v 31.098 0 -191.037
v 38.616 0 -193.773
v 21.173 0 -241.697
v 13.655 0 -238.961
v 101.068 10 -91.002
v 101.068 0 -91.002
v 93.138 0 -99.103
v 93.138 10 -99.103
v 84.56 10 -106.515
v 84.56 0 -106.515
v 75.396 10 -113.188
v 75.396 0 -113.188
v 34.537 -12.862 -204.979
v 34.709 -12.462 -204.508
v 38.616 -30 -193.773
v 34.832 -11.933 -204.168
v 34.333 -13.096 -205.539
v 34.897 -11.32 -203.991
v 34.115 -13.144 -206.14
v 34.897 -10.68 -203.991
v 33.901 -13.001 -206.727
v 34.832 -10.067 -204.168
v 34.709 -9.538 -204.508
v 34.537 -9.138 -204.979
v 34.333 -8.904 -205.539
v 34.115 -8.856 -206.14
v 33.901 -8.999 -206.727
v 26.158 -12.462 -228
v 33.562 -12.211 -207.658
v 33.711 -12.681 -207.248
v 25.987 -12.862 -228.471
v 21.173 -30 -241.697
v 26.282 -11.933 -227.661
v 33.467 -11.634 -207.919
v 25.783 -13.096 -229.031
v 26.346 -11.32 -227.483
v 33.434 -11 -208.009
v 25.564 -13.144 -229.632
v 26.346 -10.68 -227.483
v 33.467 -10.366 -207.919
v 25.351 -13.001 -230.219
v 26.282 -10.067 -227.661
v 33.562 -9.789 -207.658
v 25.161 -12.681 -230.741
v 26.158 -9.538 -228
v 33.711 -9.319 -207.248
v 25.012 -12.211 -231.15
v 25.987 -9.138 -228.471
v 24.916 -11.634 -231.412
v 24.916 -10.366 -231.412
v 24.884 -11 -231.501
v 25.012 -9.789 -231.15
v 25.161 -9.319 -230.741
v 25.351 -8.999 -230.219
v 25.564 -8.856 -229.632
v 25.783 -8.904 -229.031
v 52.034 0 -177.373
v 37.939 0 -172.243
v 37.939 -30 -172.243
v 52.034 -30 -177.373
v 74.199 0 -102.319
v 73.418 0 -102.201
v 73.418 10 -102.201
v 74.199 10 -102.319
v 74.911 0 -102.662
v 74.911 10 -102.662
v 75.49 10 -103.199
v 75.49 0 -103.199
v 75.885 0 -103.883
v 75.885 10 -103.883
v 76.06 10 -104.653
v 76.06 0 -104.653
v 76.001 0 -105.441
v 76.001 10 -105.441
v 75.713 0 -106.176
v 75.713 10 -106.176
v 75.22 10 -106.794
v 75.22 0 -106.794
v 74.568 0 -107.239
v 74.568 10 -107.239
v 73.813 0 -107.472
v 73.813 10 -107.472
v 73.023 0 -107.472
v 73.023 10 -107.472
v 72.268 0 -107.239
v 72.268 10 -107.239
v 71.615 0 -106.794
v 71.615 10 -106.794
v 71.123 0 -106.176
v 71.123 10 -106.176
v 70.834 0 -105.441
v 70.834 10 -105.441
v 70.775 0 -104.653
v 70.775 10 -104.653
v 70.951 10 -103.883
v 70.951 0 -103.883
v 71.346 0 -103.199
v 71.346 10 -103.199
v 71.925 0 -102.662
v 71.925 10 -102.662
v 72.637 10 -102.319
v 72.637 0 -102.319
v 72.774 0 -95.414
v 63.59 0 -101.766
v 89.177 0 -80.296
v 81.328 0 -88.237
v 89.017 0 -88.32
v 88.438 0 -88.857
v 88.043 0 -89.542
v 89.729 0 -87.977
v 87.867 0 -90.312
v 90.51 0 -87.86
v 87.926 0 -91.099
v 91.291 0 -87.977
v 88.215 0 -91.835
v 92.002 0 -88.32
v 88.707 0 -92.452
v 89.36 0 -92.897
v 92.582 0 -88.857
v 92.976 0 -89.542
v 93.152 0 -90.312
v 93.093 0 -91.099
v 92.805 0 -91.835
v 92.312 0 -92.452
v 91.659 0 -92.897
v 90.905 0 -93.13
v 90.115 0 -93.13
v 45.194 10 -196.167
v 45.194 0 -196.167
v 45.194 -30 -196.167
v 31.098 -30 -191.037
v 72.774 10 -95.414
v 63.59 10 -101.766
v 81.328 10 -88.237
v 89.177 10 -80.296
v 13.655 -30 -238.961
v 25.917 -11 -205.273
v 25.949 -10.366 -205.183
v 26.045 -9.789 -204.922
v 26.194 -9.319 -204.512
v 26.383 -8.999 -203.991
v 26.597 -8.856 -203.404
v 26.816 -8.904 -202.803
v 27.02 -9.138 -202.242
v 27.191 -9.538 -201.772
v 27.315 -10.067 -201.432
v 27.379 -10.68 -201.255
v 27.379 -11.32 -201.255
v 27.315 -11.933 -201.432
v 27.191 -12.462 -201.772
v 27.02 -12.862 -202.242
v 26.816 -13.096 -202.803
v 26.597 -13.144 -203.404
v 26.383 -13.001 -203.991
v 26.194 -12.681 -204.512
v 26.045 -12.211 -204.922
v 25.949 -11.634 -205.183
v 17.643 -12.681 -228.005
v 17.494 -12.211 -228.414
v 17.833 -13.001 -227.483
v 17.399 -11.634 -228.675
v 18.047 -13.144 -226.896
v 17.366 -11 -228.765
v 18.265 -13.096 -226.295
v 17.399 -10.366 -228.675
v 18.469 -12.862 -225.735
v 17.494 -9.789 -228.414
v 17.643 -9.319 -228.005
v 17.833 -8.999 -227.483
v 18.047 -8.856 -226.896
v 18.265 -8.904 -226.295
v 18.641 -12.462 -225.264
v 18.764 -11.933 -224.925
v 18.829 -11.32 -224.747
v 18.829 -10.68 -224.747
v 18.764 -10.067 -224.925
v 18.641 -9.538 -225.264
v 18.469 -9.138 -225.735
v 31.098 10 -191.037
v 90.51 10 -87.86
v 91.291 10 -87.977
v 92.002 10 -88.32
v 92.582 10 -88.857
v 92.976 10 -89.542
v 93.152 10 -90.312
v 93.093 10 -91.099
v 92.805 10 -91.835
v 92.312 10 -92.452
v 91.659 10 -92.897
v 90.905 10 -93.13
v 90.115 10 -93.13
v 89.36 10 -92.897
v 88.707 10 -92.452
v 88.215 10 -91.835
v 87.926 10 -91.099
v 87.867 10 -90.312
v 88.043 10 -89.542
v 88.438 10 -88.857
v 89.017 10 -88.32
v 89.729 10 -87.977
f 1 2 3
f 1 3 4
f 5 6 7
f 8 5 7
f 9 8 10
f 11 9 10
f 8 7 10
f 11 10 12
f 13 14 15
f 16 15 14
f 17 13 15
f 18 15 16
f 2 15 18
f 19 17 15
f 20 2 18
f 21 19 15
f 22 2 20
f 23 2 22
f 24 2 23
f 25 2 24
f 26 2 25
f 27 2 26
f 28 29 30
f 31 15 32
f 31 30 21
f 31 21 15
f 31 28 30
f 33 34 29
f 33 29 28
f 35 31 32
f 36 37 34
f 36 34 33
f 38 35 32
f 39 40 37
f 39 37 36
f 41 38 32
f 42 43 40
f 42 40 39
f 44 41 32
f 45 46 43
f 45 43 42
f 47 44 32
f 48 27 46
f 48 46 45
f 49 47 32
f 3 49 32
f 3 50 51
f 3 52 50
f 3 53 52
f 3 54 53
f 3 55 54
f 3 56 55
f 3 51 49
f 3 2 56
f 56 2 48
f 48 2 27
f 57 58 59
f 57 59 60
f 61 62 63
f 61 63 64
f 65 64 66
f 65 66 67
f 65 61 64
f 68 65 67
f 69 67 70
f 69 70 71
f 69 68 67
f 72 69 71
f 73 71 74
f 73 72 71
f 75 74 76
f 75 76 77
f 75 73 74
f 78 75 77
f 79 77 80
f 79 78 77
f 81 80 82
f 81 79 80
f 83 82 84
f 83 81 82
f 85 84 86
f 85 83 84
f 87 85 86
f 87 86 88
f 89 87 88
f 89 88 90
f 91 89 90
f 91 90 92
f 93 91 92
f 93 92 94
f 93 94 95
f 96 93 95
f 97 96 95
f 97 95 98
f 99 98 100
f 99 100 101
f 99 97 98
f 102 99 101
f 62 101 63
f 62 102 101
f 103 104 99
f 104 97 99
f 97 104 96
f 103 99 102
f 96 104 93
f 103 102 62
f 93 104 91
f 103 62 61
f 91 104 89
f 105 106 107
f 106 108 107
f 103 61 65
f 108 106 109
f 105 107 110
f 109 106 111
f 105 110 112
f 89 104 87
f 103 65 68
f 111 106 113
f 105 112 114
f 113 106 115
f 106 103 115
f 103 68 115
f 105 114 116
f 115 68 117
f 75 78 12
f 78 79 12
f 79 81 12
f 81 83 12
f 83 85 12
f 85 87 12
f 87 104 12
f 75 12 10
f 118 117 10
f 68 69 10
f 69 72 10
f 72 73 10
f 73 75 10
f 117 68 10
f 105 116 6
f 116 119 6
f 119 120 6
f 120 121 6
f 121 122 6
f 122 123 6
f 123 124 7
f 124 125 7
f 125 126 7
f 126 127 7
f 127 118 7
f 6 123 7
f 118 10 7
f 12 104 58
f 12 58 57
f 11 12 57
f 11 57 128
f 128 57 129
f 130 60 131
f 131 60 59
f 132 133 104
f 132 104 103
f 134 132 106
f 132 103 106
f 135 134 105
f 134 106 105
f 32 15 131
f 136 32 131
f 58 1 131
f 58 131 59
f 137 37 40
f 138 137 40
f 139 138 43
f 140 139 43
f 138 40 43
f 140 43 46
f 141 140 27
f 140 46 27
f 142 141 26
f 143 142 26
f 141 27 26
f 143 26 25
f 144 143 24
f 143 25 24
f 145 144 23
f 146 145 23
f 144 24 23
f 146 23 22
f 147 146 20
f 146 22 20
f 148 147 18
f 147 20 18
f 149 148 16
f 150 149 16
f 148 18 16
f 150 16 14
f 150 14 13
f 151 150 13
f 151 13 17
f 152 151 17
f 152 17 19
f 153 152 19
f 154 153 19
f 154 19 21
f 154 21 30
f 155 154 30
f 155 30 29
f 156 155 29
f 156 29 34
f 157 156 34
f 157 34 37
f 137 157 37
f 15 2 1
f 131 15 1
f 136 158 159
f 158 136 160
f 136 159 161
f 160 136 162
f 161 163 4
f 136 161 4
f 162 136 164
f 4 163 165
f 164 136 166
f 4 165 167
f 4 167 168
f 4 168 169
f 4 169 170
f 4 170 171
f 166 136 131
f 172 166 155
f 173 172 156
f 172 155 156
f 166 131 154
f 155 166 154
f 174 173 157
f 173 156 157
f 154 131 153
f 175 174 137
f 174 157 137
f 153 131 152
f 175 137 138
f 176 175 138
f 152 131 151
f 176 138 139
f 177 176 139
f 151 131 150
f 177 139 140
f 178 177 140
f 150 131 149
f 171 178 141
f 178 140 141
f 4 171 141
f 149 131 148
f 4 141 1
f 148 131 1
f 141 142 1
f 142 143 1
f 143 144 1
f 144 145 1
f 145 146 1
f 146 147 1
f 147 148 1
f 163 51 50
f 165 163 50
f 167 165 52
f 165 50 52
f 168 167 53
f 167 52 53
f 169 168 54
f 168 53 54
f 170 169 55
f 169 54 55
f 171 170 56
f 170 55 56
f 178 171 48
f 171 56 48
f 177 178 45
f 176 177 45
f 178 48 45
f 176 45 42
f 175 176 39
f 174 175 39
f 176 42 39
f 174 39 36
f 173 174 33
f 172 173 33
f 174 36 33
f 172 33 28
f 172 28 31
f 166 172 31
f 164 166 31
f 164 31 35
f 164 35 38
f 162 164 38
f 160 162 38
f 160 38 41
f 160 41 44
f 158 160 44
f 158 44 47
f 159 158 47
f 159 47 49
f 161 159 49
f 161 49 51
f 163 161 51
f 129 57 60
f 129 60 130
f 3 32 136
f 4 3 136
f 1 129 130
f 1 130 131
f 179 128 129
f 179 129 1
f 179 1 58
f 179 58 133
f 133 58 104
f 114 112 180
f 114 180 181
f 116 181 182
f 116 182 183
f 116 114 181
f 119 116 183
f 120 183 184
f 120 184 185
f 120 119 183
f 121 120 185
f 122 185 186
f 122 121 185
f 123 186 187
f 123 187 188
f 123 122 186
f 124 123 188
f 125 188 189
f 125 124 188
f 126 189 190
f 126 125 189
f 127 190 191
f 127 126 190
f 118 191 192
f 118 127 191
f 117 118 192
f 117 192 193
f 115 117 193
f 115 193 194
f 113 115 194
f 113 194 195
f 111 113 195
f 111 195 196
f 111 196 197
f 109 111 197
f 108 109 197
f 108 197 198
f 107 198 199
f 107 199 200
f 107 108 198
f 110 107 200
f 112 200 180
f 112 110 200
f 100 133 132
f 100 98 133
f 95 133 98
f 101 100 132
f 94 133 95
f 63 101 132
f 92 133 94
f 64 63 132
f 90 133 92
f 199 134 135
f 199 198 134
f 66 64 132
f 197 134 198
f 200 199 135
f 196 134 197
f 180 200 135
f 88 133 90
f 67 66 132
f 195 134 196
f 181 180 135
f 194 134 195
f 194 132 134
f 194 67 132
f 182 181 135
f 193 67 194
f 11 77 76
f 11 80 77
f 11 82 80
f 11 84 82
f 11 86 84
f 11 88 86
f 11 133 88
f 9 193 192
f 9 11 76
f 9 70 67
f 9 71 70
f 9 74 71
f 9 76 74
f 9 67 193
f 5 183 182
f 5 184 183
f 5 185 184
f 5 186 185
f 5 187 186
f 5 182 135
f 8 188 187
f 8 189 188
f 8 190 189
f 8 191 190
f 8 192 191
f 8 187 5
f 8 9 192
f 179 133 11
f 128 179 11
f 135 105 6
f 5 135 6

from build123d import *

# Parameters (mm, degrees)
SKETCH_1_R          = 2.65
EXTRUDE_3_DEPTH     = 10
EXTRUDE_4_DEPTH     = 30
SKETCH_15_W         = 15
SKETCH_15_H         = 30
EXTRUDE_5_DEPTH     = 51
SKETCH_16_R         = 2.15
CUT_EXTRUDE_6_DEPTH = 228.080726912
SKETCH_17_W         = 51
SKETCH_17_H         = 30
CUT_EXTRUDE_7_DEPTH = 7


with BuildPart() as part:
    # 草图1 → 凸台-拉伸3 (new body)
    with BuildSketch(Plane(origin=(0, 0, 0), x_dir=(1, 0, 0), z_dir=(0, 1, 0))):
        with BuildLine():
            Line((31.098398092, 191.036570513), (63.590311708, 101.765771539))
            ThreePointArc((63.590311708, 101.765771539), (77.134513162, 91.925333174), (89.177379057, 80.295672763))
            Line((89.177379057, 80.295672763), (101.067696265, 91.001762465))
            ThreePointArc((101.067696265, 91.001762465), (88.926297254, 102.898560033), (75.395677923, 113.187860438))
            Line((75.395677923, 113.187860438), (45.193787404, 196.166872663))
            Line((45.193787404, 196.166872663), (31.098398092, 191.036570513))
        make_face()
        with Locations(Location((73.417783853, 104.851461669, 0), (0, 0, 270))):
            Circle(SKETCH_1_R, mode=Mode.SUBTRACT)
        with Locations(Location((90.509667992, 90.509667992, 0), (0, 0, 270))):
            Circle(SKETCH_1_R, mode=Mode.SUBTRACT)
    extrude(amount=EXTRUDE_3_DEPTH)

    # 草图14 → 凸台-拉伸4 (add)
    with BuildSketch(Plane.XZ):
        Polygon((45.193787404, -196.166872663), (31.098398092, -191.036570513), (37.938800959, -172.242718098), (52.03419027, -177.373020248), align=None)
    extrude(amount=EXTRUDE_4_DEPTH)


with BuildPart() as body_2:
    # 草图15 → 凸台-拉伸5 (new body)
    with BuildSketch(Plane(origin=(-57.76014874, 0, -158.694704407), x_dir=(-0.9396926207859112, 0, 0.3420201433256609), z_dir=(-0.3420201433256609, 0, -0.9396926207859113))):
        with Locations((-102.061290433, -15)):
            Rectangle(SKETCH_15_W, SKETCH_15_H)
    extrude(amount=EXTRUDE_5_DEPTH)

    # 草图16 → 切除-拉伸6 (cut, through all)
    with BuildSketch(Plane(origin=(102.953936143, 0, -37.472168257), x_dir=(-0.34202014332566083, 0, -0.9396926207859113), z_dir=(0.9396926207859113, 0, -0.34202014332566083))):
        with Locations((206.879377039, -11)):
            Circle(SKETCH_16_R)
        with Locations((181.879377039, -11)):
            Circle(SKETCH_16_R)
    extrude(amount=-CUT_EXTRUDE_6_DEPTH, mode=Mode.SUBTRACT)

    # 草图17 → 切除-拉伸7 (cut)
    with BuildSketch(Plane(origin=(102.953936143, 0, -37.472168257), x_dir=(-0.34202014332566083, 0, -0.9396926207859113), z_dir=(0.9396926207859113, 0, -0.34202014332566083))):
        with Locations((194.379377039, -15)):
            Rectangle(SKETCH_17_W, SKETCH_17_H)
    extrude(amount=-CUT_EXTRUDE_7_DEPTH, mode=Mode.SUBTRACT)


solid = Compound([part.part, body_2.part])
